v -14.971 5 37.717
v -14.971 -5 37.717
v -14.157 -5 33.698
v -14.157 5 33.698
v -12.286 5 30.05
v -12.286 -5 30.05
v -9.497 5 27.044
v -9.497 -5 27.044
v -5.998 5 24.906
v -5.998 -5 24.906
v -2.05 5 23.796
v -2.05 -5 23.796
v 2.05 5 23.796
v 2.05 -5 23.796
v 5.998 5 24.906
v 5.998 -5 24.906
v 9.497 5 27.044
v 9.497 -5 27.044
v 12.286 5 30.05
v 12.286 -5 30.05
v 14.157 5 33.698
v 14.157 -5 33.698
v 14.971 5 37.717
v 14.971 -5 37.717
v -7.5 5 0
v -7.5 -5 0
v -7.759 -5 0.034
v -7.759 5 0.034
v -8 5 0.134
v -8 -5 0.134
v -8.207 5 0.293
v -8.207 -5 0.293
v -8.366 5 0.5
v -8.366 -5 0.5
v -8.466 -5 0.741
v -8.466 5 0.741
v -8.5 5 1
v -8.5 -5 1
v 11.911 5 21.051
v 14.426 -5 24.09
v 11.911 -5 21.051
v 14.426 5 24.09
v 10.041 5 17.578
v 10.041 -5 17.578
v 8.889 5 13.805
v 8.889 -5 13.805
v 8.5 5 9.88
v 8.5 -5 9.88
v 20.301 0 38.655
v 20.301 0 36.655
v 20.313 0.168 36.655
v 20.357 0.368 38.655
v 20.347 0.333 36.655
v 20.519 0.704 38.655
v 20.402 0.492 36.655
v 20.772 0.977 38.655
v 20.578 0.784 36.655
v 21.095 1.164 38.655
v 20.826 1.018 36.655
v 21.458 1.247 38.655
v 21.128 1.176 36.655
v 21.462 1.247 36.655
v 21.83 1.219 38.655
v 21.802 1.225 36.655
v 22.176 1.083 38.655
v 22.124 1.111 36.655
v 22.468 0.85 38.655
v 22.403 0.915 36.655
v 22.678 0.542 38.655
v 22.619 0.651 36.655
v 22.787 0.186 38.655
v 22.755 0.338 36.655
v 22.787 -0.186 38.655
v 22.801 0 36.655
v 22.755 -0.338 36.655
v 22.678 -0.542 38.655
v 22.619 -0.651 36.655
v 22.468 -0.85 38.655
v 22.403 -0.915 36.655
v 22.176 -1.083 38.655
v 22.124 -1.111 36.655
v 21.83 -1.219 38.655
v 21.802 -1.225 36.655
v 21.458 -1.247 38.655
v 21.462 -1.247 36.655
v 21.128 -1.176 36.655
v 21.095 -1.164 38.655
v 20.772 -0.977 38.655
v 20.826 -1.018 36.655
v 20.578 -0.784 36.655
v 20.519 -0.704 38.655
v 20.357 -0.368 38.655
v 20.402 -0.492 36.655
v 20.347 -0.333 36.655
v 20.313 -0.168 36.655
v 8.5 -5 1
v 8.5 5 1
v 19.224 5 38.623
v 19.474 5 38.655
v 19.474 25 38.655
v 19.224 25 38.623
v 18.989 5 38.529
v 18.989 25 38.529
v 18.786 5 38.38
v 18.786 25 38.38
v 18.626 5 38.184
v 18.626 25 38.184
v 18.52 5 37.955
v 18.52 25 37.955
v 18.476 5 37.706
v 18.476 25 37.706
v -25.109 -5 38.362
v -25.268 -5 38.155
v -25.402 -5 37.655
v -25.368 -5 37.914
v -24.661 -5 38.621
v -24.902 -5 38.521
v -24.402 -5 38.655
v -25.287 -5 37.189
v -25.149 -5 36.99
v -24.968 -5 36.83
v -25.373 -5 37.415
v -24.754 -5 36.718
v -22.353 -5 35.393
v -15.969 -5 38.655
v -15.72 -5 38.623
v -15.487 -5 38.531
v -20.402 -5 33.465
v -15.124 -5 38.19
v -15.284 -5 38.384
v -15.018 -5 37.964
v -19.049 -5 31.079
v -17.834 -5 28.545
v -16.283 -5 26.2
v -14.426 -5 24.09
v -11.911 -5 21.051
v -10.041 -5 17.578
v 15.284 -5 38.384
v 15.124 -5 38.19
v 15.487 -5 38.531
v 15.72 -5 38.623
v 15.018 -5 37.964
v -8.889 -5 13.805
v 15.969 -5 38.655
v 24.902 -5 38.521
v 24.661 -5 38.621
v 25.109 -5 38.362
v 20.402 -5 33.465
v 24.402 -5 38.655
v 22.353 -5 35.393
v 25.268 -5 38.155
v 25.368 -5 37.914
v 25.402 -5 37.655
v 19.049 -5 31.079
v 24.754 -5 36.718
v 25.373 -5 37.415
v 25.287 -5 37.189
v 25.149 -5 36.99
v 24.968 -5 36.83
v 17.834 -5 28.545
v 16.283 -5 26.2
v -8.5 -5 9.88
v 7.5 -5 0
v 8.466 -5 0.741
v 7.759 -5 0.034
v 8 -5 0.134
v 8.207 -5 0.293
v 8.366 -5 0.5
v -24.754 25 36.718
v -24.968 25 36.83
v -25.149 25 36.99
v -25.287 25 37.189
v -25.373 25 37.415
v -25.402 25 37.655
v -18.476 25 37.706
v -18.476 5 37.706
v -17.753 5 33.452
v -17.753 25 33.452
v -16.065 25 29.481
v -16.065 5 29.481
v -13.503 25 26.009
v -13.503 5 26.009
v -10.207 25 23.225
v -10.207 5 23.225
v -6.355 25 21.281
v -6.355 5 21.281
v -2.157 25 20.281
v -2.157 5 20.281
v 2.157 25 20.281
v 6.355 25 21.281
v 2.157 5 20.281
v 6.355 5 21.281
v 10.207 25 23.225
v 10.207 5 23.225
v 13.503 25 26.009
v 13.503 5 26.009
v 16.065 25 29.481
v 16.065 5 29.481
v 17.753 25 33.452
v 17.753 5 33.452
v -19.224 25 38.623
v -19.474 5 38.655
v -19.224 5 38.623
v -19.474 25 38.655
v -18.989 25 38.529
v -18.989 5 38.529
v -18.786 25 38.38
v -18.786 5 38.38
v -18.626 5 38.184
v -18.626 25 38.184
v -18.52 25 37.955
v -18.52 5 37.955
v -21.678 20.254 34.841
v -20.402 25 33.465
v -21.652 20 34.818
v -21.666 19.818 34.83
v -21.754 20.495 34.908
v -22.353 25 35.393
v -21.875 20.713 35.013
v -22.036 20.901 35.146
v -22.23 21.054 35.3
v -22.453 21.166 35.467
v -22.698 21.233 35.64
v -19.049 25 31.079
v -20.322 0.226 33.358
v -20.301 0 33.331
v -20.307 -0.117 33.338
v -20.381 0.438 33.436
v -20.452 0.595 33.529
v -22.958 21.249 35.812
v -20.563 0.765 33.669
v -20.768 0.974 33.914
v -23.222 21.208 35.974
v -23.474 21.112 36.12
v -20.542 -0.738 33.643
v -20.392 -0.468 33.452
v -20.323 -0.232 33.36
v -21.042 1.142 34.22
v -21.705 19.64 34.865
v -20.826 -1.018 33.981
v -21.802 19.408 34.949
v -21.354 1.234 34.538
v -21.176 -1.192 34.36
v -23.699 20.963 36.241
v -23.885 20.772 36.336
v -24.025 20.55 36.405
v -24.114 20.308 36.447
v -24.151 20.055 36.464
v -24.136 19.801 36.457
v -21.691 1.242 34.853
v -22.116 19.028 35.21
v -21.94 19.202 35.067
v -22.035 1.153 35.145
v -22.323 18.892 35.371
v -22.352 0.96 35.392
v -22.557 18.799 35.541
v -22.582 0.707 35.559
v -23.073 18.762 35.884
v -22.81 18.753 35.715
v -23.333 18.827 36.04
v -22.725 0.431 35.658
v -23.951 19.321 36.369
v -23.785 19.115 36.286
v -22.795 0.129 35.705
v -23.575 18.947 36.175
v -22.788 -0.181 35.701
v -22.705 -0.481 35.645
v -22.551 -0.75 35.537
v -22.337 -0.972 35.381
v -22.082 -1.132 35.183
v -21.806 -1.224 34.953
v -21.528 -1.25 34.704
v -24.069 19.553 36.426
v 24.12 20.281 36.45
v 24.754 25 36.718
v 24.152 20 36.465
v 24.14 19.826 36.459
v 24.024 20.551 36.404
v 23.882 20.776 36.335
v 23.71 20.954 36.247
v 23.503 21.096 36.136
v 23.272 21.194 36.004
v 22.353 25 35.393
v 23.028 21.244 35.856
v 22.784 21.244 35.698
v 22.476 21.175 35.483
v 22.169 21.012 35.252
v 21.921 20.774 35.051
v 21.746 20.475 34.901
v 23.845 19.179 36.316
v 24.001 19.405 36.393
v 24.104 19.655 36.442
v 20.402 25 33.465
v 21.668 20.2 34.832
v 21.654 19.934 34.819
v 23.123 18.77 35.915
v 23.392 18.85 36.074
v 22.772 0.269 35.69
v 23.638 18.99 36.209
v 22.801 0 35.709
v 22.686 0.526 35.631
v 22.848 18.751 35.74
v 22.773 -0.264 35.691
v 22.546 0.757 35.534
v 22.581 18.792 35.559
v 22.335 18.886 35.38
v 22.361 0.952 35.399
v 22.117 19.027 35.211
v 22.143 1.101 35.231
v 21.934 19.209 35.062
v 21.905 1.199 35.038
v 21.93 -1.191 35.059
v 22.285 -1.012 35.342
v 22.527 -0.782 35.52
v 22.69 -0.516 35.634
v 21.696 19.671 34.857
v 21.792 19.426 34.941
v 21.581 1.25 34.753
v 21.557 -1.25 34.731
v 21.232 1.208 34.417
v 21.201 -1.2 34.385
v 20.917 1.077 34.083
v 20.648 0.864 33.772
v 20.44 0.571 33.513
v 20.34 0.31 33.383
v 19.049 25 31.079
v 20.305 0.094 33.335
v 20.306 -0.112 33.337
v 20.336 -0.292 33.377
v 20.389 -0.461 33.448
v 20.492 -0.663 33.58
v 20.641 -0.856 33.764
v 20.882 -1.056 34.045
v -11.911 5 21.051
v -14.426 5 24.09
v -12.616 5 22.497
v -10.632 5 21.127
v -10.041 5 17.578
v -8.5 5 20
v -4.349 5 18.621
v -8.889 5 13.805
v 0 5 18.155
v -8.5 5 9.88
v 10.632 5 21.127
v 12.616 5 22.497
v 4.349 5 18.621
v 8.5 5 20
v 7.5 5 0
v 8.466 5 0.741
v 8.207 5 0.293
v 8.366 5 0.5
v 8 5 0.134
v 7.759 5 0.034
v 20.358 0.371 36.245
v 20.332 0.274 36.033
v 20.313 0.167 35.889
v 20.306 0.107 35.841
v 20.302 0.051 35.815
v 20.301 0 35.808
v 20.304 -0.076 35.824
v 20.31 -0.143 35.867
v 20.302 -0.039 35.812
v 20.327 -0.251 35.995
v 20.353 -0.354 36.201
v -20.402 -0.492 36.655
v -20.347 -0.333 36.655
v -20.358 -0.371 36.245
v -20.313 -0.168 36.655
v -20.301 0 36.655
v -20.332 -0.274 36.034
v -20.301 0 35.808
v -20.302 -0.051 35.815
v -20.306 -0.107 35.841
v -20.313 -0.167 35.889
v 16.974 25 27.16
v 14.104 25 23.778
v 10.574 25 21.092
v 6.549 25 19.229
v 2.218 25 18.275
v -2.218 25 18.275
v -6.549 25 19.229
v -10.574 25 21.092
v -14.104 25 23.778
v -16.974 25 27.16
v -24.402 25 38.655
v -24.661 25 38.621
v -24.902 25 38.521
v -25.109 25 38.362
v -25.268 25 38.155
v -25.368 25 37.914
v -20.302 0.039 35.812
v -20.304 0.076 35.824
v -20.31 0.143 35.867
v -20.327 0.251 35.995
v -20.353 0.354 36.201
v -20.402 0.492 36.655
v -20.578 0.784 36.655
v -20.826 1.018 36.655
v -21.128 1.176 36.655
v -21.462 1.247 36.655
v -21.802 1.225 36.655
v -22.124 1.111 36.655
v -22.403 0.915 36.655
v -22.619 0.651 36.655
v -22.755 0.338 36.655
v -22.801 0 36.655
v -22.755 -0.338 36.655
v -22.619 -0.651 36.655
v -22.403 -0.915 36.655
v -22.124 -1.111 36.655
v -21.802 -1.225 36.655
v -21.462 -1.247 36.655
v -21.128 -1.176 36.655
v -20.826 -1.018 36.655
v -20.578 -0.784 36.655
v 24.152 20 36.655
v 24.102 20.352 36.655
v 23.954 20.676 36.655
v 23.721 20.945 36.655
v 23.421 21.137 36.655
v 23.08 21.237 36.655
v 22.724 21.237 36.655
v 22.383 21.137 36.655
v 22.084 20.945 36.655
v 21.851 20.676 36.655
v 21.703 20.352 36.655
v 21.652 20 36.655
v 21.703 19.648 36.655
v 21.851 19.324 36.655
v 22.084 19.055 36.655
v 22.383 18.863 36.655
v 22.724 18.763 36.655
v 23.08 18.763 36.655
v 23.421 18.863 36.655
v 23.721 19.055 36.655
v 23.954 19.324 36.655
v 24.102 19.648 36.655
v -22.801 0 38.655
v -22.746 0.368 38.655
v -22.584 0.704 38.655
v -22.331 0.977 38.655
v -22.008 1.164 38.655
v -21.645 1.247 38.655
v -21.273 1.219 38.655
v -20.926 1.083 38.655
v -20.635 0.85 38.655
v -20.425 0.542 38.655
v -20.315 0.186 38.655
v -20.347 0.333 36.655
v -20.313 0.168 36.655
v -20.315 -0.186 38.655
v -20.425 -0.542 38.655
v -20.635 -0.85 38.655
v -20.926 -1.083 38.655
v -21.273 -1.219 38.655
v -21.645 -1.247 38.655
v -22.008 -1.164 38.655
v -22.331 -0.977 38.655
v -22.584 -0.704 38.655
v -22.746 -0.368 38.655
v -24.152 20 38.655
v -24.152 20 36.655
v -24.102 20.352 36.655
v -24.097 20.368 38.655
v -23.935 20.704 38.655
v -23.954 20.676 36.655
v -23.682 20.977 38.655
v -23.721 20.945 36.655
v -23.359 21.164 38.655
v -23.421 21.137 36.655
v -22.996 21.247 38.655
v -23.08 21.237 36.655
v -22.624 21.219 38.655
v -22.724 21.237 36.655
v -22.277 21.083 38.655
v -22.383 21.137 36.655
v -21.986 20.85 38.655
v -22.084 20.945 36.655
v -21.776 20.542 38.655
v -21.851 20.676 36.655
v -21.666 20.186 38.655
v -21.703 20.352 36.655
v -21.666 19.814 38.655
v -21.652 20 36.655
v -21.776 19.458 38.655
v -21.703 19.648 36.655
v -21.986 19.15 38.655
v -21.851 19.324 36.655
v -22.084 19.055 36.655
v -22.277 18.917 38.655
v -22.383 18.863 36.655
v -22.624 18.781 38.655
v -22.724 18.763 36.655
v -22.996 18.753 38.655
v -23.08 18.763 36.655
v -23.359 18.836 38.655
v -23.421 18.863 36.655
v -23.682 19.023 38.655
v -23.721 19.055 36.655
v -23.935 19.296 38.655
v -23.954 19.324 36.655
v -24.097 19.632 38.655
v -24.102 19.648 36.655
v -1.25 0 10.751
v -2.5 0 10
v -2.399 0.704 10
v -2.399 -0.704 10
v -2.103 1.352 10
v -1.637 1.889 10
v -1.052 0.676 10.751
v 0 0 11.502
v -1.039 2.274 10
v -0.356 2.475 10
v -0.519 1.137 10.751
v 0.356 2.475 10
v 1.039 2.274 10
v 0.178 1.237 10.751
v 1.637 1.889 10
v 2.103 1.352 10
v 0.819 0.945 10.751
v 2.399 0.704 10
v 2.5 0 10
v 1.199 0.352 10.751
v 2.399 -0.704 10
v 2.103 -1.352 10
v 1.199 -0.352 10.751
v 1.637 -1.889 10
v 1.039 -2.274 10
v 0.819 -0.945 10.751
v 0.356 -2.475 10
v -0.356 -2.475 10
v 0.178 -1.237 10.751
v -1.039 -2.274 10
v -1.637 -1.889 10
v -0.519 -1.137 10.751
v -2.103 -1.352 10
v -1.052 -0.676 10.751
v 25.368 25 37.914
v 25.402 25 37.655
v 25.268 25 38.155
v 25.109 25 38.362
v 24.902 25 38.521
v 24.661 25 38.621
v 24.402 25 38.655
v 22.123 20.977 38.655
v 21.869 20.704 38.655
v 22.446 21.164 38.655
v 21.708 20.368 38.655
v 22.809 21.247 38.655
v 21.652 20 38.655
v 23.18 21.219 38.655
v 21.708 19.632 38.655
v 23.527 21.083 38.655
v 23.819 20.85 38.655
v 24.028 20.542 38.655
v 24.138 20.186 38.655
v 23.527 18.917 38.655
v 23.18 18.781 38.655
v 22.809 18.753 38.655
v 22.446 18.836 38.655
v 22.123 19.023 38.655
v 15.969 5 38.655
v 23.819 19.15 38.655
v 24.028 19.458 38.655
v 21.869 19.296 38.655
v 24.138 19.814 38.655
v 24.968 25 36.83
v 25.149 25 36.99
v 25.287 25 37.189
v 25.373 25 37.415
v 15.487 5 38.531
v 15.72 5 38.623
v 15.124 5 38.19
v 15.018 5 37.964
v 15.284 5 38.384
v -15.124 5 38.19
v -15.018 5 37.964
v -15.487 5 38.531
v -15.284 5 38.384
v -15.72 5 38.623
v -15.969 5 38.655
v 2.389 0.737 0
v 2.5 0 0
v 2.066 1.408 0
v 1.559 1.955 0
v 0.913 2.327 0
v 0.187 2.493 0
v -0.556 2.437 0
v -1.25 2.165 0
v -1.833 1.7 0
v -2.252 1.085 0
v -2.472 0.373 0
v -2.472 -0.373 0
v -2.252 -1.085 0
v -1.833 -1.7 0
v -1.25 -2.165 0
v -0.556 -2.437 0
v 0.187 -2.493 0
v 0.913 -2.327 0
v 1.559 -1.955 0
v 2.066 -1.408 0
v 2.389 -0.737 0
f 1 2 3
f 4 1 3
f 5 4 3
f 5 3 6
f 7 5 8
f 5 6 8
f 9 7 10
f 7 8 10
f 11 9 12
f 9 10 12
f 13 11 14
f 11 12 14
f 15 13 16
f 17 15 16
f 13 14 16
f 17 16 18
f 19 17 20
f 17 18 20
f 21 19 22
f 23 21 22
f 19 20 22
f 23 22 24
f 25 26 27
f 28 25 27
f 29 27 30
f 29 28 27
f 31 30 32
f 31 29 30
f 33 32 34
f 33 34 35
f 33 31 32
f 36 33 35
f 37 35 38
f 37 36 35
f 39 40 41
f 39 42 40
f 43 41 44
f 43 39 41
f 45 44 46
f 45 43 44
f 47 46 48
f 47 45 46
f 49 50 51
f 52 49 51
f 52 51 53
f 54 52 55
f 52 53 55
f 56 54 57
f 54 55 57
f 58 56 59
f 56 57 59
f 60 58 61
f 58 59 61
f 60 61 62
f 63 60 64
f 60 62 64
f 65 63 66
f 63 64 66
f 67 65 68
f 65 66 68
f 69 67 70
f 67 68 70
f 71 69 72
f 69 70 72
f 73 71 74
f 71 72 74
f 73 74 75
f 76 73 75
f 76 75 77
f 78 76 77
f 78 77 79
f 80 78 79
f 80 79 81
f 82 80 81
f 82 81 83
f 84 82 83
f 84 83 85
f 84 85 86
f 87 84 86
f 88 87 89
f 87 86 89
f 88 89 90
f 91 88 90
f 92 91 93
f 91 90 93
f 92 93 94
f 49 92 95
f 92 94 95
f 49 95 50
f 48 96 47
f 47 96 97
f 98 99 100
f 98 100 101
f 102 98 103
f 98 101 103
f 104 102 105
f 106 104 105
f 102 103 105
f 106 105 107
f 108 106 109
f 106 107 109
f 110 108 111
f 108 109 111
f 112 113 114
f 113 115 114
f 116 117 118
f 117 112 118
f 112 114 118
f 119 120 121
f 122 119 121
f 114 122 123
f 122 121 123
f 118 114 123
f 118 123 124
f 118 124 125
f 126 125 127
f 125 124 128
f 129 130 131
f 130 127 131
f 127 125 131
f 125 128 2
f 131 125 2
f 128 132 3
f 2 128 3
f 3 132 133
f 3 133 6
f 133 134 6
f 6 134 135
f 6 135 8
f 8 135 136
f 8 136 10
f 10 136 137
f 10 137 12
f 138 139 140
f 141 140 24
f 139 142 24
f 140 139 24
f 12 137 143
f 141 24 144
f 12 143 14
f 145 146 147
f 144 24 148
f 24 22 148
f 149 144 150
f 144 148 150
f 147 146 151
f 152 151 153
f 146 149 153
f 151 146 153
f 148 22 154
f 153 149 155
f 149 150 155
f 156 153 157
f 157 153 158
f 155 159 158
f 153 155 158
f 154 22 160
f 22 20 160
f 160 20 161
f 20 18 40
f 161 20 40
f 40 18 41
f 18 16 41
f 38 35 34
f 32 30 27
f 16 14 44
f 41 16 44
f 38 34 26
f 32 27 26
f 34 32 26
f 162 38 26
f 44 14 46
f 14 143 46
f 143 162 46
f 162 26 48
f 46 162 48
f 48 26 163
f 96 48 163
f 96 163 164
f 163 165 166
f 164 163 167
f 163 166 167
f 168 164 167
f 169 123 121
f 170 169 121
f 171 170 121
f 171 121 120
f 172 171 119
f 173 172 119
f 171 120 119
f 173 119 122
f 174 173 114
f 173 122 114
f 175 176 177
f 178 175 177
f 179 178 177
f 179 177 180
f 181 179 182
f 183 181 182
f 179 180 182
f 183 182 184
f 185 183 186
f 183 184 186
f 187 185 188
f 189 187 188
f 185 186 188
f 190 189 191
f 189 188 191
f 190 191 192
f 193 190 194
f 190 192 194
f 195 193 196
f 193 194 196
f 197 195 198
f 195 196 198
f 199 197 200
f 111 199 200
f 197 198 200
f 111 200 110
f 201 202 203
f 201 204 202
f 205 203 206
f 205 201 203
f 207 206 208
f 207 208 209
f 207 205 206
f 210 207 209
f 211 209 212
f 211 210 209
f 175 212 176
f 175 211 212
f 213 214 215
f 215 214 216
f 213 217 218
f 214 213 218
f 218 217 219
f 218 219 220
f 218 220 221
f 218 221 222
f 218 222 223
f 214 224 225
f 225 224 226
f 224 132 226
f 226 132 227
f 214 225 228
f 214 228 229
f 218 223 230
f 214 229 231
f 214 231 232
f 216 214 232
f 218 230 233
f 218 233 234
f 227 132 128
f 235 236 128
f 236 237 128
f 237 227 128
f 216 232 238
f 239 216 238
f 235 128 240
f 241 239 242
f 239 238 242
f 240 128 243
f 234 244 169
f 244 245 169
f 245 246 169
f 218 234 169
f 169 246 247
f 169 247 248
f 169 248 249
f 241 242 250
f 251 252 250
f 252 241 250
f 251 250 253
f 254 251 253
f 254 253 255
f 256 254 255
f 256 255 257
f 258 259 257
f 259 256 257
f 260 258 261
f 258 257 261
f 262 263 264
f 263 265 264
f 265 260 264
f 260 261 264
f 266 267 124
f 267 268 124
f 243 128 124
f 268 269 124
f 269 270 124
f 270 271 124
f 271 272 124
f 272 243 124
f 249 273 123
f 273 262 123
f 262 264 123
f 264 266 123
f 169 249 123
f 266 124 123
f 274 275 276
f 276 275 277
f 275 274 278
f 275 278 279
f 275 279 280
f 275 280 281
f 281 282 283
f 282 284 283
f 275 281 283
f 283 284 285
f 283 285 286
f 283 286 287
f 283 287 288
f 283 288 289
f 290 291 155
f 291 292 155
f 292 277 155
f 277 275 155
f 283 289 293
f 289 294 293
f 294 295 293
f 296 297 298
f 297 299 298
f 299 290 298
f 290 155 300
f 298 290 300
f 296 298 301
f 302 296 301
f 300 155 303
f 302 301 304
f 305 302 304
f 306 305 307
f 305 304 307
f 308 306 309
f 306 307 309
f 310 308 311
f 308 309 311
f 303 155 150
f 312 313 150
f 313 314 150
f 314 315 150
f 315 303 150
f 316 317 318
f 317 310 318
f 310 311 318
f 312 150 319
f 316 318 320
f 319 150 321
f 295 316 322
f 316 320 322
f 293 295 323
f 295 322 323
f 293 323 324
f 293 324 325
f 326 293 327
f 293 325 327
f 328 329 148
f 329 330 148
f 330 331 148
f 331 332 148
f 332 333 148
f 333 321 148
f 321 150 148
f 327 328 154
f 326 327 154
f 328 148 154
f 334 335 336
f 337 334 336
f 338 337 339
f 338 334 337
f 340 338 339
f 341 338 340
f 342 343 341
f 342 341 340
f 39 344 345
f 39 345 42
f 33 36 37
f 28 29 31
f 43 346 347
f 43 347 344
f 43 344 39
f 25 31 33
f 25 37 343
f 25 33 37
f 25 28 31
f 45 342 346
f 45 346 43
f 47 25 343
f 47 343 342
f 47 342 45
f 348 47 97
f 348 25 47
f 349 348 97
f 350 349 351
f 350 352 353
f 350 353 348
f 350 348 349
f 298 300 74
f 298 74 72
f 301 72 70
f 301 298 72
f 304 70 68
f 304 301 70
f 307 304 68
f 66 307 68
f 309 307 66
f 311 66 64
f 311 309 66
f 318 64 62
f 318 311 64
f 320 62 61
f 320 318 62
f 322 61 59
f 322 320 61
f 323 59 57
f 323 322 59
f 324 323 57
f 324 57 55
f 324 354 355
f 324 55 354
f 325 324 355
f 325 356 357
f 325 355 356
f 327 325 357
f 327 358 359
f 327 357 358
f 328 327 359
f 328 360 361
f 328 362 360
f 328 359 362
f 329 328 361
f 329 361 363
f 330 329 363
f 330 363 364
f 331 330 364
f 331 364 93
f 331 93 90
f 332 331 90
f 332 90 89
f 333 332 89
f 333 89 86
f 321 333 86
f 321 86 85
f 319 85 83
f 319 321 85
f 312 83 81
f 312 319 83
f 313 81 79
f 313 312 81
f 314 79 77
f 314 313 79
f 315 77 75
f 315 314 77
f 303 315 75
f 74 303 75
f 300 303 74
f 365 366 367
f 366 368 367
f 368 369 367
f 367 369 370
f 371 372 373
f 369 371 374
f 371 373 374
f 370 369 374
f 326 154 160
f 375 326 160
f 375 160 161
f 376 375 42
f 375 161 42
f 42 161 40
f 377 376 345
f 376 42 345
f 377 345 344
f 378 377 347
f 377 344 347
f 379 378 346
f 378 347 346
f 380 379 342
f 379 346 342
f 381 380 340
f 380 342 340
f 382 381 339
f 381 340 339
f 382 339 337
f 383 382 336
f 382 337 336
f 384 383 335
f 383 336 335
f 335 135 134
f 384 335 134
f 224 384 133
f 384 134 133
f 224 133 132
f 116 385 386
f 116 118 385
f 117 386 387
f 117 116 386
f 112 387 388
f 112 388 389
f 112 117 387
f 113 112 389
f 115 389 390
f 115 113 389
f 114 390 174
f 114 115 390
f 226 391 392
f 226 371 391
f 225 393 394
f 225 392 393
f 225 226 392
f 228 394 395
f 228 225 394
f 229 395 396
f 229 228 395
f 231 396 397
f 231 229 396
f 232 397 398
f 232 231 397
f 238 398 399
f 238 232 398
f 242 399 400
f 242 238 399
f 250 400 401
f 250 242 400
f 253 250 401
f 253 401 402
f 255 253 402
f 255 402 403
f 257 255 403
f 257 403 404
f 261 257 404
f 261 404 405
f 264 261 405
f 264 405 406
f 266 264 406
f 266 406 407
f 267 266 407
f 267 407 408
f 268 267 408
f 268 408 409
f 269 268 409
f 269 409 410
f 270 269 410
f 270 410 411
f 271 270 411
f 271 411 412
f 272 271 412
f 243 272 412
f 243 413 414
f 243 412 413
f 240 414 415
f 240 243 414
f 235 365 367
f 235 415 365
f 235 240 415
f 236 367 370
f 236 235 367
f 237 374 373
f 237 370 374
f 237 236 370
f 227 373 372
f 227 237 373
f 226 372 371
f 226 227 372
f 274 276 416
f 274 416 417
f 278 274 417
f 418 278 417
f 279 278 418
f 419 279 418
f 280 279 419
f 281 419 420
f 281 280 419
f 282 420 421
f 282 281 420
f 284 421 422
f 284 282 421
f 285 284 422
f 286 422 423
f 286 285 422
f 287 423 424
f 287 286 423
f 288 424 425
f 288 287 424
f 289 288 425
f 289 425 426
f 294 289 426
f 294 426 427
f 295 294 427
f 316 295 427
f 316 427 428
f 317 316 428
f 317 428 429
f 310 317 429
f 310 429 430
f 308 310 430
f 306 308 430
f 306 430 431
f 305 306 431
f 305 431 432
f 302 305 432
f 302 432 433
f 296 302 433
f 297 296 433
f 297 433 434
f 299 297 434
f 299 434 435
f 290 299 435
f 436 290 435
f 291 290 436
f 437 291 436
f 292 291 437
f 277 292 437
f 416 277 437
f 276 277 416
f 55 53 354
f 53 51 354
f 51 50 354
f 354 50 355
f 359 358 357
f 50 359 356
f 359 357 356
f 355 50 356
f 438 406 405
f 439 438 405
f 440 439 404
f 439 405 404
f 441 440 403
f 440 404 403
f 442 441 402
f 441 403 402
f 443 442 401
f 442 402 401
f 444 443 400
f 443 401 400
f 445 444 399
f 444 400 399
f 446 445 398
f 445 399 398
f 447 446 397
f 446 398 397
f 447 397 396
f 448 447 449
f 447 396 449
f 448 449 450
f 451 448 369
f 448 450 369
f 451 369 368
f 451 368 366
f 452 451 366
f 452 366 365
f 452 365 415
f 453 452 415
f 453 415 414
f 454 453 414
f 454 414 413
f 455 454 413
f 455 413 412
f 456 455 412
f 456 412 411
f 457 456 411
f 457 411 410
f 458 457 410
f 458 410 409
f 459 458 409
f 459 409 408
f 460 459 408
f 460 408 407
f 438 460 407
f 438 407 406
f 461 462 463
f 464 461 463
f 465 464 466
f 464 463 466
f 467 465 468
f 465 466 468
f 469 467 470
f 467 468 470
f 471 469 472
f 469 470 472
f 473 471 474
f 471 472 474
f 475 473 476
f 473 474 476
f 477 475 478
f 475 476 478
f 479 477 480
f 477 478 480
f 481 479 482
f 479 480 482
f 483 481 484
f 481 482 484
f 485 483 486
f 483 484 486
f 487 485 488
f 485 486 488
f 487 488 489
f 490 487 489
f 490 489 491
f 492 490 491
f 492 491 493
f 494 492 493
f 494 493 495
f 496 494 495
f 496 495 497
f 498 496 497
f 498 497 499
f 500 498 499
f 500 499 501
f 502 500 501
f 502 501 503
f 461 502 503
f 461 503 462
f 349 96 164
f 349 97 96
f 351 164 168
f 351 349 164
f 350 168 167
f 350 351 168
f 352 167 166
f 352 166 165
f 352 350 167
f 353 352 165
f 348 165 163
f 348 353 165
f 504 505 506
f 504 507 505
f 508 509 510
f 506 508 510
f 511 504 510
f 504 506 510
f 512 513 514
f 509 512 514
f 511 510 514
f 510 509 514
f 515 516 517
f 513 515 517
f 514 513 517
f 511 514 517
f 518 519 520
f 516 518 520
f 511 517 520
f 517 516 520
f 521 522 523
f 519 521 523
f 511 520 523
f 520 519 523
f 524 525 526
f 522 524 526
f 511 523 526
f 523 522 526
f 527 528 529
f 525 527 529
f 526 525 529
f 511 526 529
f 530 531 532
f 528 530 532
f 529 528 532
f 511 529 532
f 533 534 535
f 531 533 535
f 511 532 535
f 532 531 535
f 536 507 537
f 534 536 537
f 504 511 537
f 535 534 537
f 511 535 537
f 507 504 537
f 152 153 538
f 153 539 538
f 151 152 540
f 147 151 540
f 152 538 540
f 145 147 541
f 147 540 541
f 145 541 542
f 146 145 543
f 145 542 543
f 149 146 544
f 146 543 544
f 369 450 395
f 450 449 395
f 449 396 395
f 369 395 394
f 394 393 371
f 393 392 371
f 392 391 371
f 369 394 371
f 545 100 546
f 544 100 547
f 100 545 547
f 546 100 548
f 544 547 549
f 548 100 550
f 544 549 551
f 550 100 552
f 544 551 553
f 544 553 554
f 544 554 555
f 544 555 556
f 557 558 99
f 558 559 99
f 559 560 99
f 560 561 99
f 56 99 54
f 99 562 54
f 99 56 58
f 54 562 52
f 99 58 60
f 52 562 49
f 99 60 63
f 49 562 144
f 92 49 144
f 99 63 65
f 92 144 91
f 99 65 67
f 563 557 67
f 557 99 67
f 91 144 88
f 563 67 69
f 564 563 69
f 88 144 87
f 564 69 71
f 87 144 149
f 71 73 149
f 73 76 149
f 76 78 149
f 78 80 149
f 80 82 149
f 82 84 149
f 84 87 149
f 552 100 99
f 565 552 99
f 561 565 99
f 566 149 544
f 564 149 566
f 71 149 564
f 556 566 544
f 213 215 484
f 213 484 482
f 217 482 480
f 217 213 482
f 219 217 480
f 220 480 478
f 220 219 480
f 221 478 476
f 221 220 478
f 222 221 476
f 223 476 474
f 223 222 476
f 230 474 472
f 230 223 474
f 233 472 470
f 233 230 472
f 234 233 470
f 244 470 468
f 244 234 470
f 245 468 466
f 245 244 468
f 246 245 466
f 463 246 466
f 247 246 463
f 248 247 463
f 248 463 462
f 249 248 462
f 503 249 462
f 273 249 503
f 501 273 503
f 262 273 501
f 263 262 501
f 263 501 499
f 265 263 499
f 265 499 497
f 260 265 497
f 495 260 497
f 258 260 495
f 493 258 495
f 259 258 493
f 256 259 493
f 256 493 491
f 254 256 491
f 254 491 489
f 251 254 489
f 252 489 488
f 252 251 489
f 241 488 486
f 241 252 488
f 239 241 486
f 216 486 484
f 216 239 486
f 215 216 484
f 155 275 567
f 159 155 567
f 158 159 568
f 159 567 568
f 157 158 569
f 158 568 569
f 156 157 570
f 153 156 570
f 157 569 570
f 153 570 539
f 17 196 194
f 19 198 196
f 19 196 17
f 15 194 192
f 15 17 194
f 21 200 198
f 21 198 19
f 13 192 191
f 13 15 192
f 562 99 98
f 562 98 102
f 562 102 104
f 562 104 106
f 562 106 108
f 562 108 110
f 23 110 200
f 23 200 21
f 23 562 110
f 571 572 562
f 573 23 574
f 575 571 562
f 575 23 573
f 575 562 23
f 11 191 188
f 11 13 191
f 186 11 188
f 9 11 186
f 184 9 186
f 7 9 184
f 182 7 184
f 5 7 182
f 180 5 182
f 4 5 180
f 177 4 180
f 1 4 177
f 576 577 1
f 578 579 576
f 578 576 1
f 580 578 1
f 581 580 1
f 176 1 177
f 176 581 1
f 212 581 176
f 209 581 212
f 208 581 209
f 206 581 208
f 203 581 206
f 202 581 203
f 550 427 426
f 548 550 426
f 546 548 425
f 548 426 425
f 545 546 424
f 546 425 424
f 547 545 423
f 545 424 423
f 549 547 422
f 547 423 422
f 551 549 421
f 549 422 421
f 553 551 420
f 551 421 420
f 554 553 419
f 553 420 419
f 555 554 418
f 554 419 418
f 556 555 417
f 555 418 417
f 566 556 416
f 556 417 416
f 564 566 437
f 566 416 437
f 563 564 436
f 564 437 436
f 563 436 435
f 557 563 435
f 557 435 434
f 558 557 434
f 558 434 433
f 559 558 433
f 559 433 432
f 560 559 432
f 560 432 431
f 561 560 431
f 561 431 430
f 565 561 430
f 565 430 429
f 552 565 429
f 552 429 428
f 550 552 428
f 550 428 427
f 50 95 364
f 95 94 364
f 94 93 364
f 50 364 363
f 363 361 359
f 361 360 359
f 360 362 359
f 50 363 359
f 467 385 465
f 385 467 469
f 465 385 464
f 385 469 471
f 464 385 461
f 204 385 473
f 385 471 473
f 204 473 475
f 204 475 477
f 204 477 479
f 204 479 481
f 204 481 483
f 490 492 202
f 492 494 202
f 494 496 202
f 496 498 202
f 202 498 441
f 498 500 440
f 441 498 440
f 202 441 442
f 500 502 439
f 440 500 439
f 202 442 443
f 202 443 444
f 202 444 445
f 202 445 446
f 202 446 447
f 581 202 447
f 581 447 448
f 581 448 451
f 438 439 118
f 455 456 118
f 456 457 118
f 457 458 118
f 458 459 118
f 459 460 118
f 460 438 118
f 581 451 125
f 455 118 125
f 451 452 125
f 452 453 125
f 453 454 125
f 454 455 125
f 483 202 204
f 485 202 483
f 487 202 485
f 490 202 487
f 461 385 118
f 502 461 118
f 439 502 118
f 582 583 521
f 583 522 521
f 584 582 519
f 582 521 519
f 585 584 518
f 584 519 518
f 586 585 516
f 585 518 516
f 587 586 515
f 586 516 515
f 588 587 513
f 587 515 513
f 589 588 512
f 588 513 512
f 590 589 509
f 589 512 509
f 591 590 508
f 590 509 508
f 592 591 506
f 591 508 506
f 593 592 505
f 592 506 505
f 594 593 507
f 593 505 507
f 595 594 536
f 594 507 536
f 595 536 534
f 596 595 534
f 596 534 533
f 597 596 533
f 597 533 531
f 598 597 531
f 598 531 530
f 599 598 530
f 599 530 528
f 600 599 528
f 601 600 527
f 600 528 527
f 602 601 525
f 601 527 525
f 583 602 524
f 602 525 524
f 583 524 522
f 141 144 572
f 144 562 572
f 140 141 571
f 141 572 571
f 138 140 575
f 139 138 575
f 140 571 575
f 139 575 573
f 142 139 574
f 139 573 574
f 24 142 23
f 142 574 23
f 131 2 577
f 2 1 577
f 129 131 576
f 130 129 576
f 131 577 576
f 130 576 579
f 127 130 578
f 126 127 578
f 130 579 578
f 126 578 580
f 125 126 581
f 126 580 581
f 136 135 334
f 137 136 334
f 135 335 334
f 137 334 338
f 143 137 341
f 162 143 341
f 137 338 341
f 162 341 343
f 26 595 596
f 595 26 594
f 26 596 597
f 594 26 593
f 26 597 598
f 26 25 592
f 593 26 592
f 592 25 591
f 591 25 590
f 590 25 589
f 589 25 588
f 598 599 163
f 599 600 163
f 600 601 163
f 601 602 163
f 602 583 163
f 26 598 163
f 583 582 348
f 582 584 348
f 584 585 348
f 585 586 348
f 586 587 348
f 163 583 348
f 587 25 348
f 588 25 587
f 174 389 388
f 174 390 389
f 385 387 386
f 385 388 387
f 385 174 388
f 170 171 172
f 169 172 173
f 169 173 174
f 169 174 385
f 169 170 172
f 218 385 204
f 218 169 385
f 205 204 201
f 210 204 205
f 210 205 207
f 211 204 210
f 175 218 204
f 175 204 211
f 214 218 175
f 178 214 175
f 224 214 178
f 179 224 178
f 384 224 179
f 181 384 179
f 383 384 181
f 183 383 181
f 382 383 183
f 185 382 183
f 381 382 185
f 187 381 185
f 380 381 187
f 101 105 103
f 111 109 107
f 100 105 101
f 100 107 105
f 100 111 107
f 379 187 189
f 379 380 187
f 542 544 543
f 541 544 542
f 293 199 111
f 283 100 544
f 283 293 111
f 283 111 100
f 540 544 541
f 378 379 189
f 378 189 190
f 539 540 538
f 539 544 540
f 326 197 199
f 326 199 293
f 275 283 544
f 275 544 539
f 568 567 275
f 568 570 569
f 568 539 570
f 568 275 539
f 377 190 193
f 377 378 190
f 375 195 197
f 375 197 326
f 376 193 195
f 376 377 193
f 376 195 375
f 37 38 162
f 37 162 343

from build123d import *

# Parameters (mm, degrees)
ESQUISSE1_W                               = 17
ESQUISSE1_H                               = 10
BOSS_EXTRU_1_DEPTH                        = 20
TROUS_DE_CENTRAGE_5_0MM1_D                = 5
TROUS_DE_CENTRAGE_5_0MM1_DEPTH            = 10
TROUS_DE_CENTRAGE_5_0MM1_TIP              = 1.502151548
BOSS_EXTRU_2_DEPTH                        = 20
BOSS_EXTRU_3_START                        = 10
BOSS_EXTRU_3_DEPTH                        = 10
CONG_1_R                                  = 20
TROU_POUR_TARAUDAGE_POUR_TROU_TARAUD_M3_D = 2.5
CONG_2_R                                  = 1
CONG_3_START                              = -5
CONG_3_DEPTH                              = 30
CONG_3_START_2                            = 32
CONG_3_2_OUTLINE_R                        = 1.25
CONG_3_2_DEPTH                            = 4.654758106


with BuildPart() as part:
    # Esquisse1 → Boss.-Extru.1 (new body)
    with BuildSketch(Plane.XY):
        Rectangle(ESQUISSE1_W, ESQUISSE1_H)
    extrude(amount=BOSS_EXTRU_1_DEPTH)

    # Trous de centrage Ø5.0mm1
    with Locations(Plane(origin=(0, 0, 0), x_dir=(-1, 0, 0), z_dir=(0, 0, -1))):
        with Locations((0, 0)):
            Hole(TROUS_DE_CENTRAGE_5_0MM1_D / 2, depth=TROUS_DE_CENTRAGE_5_0MM1_DEPTH)
            with Locations((0, 0, -(TROUS_DE_CENTRAGE_5_0MM1_DEPTH + TROUS_DE_CENTRAGE_5_0MM1_TIP / 2))):  # 118° drill point
                Cone(0, TROUS_DE_CENTRAGE_5_0MM1_D / 2, TROUS_DE_CENTRAGE_5_0MM1_TIP, mode=Mode.SUBTRACT)

    # Esquisse4 → Boss.-Extru.2 (add)
    with BuildSketch(Plane(origin=(0, 5, 0), x_dir=(1, 0, 0), z_dir=(0, 1, 0))):
        with BuildLine():
            Line((18.5, -38.654758106), (25.402205763, -38.654758106))
            Line((25.402205763, -38.654758106), (25.402205763, -36.654758106))
            Line((25.402205763, -36.654758106), (20.402205763, -36.654758106))
            ThreePointArc((20.402205763, -36.654758106), (0, -18.154758106), (-20.402205763, -36.654758106))
            Line((-20.402205763, -36.654758106), (-25.402205763, -36.654758106))
            Line((-25.402205763, -36.654758106), (-25.402205763, -38.654758106))
            Line((-25.402205763, -38.654758106), (-18.5, -38.654758106))
            ThreePointArc((-18.5, -38.654758106), (0, -20.154758106), (18.5, -38.654758106))
        make_face()
    extrude(amount=BOSS_EXTRU_2_DEPTH)

    # Esquisse5 → Boss.-Extru.3 (add)
    with BuildSketch(Plane.XZ.offset(-5).offset(BOSS_EXTRU_3_START)):
        with BuildLine():
            Line((-18.5, 38.654758106), (-15, 38.654758106))
            ThreePointArc((-15, 38.654758106), (0, 23.654758106), (15, 38.654758106))
            Line((15, 38.654758106), (18.5, 38.654758106))
            Line((18.5, 38.654758106), (25.402205763, 38.654758106))
            Line((25.402205763, 38.654758106), (25.402205763, 36.654758106))
            Line((25.402205763, 36.654758106), (20.402205763, 36.654758106))
            ThreePointArc((20.402205763, 36.654758106), (16.678717468, 26.735429953), (8.5, 20))
            Line((8.5, 20), (-8.5, 20))
            ThreePointArc((-8.5, 20), (-16.678717468, 26.735429953), (-20.402205763, 36.654758106))
            Line((-20.402205763, 36.654758106), (-25.402205763, 36.654758106))
            Line((-25.402205763, 36.654758106), (-25.402205763, 38.654758106))
            Line((-25.402205763, 38.654758106), (-18.5, 38.654758106))
        make_face()
    extrude(amount=-BOSS_EXTRU_3_DEPTH)

    # Congé1
    cong_1_edges = [part.edges().sort_by_distance(p)[0] for p in [
        (-8.5, 0, 20),
        (8.5, 0, 20),
    ]]
    fillet(cong_1_edges, radius=CONG_1_R)

    # Trou pour taraudage pour trou taraudé M31 (through all)
    with Locations(Plane.XY.offset(38.654758106)):
        with Locations((-22.902205763, 20), (-21.551356318, 0), (21.551356318, 0), (22.902205763, 20)):
            Hole(TROU_POUR_TARAUDAGE_POUR_TROU_TARAUD_M3_D / 2)

    # Congé2
    cong_2_edges = [part.edges().sort_by_distance(p)[0] for p in [
        (-15, 0, 38.654758106),
        (-8.5, 0, 0),
        (8.5, 0, 0),
        (25.402205763, 10, 36.654758106),
        (-25.402205763, 10, 36.654758106),
        (25.402205763, 10, 38.654758106),
        (18.5, 15, 38.654758106),
        (-18.5, 15, 38.654758106),
        (15, 0, 38.654758106),
        (-25.402205763, 10, 38.654758106),
    ]]
    fillet(cong_2_edges, radius=CONG_2_R - 0.0001)  # a hair under: the kernel refuses the full size

    # Congé3: read off the stored shape, not the designer's step
    # Congé3 outline → Congé3 (add)
    with BuildSketch(Plane(origin=(0, 0, 0), x_dir=(1, 0, 0), z_dir=(0, 1, 0)).offset(CONG_3_START)):
        with BuildLine():
            ThreePointArc((-20.402205763, -36.654758106), (-19.921613651, -33.819542541), (-19.049016512, -31.079471318))
            ThreePointArc((-19.049016512, -31.079471318), (-21.313684521, -34.498543554), (-24.760297938, -36.721071866))
            ThreePointArc((-24.760297938, -36.721071866), (-24.584296071, -36.671476295), (-24.402205763, -36.654758106))
            Line((-24.402205763, -36.654758106), (-20.402205763, -36.654758106))
        make_face()
        with BuildLine():
            ThreePointArc((24.760297938, -36.721071866), (21.313684521, -34.498543554), (19.049016512, -31.079471318))
            ThreePointArc((19.049016512, -31.079471318), (19.921613651, -33.819542541), (20.402205763, -36.654758106))
            Line((20.402205763, -36.654758106), (24.402205763, -36.654758106))
            ThreePointArc((24.402205763, -36.654758106), (24.584296071, -36.671476295), (24.760297938, -36.721071866))
        make_face()
    extrude(amount=CONG_3_DEPTH)

    # Cong_3 2 outline → Cong_3 2 (cut)
    with BuildSketch(Plane.XY.offset(CONG_3_START_2)):
        with Locations((22.902205763, 20)):
            Circle(CONG_3_2_OUTLINE_R)
        with Locations((21.551356318, 0)):
            Circle(CONG_3_2_OUTLINE_R)
        with Locations((-21.551356318, 0)):
            Circle(CONG_3_2_OUTLINE_R)
        with Locations((-22.902205763, 20)):
            Circle(CONG_3_2_OUTLINE_R)
    extrude(amount=CONG_3_2_DEPTH, mode=Mode.SUBTRACT)


solid = part.part
